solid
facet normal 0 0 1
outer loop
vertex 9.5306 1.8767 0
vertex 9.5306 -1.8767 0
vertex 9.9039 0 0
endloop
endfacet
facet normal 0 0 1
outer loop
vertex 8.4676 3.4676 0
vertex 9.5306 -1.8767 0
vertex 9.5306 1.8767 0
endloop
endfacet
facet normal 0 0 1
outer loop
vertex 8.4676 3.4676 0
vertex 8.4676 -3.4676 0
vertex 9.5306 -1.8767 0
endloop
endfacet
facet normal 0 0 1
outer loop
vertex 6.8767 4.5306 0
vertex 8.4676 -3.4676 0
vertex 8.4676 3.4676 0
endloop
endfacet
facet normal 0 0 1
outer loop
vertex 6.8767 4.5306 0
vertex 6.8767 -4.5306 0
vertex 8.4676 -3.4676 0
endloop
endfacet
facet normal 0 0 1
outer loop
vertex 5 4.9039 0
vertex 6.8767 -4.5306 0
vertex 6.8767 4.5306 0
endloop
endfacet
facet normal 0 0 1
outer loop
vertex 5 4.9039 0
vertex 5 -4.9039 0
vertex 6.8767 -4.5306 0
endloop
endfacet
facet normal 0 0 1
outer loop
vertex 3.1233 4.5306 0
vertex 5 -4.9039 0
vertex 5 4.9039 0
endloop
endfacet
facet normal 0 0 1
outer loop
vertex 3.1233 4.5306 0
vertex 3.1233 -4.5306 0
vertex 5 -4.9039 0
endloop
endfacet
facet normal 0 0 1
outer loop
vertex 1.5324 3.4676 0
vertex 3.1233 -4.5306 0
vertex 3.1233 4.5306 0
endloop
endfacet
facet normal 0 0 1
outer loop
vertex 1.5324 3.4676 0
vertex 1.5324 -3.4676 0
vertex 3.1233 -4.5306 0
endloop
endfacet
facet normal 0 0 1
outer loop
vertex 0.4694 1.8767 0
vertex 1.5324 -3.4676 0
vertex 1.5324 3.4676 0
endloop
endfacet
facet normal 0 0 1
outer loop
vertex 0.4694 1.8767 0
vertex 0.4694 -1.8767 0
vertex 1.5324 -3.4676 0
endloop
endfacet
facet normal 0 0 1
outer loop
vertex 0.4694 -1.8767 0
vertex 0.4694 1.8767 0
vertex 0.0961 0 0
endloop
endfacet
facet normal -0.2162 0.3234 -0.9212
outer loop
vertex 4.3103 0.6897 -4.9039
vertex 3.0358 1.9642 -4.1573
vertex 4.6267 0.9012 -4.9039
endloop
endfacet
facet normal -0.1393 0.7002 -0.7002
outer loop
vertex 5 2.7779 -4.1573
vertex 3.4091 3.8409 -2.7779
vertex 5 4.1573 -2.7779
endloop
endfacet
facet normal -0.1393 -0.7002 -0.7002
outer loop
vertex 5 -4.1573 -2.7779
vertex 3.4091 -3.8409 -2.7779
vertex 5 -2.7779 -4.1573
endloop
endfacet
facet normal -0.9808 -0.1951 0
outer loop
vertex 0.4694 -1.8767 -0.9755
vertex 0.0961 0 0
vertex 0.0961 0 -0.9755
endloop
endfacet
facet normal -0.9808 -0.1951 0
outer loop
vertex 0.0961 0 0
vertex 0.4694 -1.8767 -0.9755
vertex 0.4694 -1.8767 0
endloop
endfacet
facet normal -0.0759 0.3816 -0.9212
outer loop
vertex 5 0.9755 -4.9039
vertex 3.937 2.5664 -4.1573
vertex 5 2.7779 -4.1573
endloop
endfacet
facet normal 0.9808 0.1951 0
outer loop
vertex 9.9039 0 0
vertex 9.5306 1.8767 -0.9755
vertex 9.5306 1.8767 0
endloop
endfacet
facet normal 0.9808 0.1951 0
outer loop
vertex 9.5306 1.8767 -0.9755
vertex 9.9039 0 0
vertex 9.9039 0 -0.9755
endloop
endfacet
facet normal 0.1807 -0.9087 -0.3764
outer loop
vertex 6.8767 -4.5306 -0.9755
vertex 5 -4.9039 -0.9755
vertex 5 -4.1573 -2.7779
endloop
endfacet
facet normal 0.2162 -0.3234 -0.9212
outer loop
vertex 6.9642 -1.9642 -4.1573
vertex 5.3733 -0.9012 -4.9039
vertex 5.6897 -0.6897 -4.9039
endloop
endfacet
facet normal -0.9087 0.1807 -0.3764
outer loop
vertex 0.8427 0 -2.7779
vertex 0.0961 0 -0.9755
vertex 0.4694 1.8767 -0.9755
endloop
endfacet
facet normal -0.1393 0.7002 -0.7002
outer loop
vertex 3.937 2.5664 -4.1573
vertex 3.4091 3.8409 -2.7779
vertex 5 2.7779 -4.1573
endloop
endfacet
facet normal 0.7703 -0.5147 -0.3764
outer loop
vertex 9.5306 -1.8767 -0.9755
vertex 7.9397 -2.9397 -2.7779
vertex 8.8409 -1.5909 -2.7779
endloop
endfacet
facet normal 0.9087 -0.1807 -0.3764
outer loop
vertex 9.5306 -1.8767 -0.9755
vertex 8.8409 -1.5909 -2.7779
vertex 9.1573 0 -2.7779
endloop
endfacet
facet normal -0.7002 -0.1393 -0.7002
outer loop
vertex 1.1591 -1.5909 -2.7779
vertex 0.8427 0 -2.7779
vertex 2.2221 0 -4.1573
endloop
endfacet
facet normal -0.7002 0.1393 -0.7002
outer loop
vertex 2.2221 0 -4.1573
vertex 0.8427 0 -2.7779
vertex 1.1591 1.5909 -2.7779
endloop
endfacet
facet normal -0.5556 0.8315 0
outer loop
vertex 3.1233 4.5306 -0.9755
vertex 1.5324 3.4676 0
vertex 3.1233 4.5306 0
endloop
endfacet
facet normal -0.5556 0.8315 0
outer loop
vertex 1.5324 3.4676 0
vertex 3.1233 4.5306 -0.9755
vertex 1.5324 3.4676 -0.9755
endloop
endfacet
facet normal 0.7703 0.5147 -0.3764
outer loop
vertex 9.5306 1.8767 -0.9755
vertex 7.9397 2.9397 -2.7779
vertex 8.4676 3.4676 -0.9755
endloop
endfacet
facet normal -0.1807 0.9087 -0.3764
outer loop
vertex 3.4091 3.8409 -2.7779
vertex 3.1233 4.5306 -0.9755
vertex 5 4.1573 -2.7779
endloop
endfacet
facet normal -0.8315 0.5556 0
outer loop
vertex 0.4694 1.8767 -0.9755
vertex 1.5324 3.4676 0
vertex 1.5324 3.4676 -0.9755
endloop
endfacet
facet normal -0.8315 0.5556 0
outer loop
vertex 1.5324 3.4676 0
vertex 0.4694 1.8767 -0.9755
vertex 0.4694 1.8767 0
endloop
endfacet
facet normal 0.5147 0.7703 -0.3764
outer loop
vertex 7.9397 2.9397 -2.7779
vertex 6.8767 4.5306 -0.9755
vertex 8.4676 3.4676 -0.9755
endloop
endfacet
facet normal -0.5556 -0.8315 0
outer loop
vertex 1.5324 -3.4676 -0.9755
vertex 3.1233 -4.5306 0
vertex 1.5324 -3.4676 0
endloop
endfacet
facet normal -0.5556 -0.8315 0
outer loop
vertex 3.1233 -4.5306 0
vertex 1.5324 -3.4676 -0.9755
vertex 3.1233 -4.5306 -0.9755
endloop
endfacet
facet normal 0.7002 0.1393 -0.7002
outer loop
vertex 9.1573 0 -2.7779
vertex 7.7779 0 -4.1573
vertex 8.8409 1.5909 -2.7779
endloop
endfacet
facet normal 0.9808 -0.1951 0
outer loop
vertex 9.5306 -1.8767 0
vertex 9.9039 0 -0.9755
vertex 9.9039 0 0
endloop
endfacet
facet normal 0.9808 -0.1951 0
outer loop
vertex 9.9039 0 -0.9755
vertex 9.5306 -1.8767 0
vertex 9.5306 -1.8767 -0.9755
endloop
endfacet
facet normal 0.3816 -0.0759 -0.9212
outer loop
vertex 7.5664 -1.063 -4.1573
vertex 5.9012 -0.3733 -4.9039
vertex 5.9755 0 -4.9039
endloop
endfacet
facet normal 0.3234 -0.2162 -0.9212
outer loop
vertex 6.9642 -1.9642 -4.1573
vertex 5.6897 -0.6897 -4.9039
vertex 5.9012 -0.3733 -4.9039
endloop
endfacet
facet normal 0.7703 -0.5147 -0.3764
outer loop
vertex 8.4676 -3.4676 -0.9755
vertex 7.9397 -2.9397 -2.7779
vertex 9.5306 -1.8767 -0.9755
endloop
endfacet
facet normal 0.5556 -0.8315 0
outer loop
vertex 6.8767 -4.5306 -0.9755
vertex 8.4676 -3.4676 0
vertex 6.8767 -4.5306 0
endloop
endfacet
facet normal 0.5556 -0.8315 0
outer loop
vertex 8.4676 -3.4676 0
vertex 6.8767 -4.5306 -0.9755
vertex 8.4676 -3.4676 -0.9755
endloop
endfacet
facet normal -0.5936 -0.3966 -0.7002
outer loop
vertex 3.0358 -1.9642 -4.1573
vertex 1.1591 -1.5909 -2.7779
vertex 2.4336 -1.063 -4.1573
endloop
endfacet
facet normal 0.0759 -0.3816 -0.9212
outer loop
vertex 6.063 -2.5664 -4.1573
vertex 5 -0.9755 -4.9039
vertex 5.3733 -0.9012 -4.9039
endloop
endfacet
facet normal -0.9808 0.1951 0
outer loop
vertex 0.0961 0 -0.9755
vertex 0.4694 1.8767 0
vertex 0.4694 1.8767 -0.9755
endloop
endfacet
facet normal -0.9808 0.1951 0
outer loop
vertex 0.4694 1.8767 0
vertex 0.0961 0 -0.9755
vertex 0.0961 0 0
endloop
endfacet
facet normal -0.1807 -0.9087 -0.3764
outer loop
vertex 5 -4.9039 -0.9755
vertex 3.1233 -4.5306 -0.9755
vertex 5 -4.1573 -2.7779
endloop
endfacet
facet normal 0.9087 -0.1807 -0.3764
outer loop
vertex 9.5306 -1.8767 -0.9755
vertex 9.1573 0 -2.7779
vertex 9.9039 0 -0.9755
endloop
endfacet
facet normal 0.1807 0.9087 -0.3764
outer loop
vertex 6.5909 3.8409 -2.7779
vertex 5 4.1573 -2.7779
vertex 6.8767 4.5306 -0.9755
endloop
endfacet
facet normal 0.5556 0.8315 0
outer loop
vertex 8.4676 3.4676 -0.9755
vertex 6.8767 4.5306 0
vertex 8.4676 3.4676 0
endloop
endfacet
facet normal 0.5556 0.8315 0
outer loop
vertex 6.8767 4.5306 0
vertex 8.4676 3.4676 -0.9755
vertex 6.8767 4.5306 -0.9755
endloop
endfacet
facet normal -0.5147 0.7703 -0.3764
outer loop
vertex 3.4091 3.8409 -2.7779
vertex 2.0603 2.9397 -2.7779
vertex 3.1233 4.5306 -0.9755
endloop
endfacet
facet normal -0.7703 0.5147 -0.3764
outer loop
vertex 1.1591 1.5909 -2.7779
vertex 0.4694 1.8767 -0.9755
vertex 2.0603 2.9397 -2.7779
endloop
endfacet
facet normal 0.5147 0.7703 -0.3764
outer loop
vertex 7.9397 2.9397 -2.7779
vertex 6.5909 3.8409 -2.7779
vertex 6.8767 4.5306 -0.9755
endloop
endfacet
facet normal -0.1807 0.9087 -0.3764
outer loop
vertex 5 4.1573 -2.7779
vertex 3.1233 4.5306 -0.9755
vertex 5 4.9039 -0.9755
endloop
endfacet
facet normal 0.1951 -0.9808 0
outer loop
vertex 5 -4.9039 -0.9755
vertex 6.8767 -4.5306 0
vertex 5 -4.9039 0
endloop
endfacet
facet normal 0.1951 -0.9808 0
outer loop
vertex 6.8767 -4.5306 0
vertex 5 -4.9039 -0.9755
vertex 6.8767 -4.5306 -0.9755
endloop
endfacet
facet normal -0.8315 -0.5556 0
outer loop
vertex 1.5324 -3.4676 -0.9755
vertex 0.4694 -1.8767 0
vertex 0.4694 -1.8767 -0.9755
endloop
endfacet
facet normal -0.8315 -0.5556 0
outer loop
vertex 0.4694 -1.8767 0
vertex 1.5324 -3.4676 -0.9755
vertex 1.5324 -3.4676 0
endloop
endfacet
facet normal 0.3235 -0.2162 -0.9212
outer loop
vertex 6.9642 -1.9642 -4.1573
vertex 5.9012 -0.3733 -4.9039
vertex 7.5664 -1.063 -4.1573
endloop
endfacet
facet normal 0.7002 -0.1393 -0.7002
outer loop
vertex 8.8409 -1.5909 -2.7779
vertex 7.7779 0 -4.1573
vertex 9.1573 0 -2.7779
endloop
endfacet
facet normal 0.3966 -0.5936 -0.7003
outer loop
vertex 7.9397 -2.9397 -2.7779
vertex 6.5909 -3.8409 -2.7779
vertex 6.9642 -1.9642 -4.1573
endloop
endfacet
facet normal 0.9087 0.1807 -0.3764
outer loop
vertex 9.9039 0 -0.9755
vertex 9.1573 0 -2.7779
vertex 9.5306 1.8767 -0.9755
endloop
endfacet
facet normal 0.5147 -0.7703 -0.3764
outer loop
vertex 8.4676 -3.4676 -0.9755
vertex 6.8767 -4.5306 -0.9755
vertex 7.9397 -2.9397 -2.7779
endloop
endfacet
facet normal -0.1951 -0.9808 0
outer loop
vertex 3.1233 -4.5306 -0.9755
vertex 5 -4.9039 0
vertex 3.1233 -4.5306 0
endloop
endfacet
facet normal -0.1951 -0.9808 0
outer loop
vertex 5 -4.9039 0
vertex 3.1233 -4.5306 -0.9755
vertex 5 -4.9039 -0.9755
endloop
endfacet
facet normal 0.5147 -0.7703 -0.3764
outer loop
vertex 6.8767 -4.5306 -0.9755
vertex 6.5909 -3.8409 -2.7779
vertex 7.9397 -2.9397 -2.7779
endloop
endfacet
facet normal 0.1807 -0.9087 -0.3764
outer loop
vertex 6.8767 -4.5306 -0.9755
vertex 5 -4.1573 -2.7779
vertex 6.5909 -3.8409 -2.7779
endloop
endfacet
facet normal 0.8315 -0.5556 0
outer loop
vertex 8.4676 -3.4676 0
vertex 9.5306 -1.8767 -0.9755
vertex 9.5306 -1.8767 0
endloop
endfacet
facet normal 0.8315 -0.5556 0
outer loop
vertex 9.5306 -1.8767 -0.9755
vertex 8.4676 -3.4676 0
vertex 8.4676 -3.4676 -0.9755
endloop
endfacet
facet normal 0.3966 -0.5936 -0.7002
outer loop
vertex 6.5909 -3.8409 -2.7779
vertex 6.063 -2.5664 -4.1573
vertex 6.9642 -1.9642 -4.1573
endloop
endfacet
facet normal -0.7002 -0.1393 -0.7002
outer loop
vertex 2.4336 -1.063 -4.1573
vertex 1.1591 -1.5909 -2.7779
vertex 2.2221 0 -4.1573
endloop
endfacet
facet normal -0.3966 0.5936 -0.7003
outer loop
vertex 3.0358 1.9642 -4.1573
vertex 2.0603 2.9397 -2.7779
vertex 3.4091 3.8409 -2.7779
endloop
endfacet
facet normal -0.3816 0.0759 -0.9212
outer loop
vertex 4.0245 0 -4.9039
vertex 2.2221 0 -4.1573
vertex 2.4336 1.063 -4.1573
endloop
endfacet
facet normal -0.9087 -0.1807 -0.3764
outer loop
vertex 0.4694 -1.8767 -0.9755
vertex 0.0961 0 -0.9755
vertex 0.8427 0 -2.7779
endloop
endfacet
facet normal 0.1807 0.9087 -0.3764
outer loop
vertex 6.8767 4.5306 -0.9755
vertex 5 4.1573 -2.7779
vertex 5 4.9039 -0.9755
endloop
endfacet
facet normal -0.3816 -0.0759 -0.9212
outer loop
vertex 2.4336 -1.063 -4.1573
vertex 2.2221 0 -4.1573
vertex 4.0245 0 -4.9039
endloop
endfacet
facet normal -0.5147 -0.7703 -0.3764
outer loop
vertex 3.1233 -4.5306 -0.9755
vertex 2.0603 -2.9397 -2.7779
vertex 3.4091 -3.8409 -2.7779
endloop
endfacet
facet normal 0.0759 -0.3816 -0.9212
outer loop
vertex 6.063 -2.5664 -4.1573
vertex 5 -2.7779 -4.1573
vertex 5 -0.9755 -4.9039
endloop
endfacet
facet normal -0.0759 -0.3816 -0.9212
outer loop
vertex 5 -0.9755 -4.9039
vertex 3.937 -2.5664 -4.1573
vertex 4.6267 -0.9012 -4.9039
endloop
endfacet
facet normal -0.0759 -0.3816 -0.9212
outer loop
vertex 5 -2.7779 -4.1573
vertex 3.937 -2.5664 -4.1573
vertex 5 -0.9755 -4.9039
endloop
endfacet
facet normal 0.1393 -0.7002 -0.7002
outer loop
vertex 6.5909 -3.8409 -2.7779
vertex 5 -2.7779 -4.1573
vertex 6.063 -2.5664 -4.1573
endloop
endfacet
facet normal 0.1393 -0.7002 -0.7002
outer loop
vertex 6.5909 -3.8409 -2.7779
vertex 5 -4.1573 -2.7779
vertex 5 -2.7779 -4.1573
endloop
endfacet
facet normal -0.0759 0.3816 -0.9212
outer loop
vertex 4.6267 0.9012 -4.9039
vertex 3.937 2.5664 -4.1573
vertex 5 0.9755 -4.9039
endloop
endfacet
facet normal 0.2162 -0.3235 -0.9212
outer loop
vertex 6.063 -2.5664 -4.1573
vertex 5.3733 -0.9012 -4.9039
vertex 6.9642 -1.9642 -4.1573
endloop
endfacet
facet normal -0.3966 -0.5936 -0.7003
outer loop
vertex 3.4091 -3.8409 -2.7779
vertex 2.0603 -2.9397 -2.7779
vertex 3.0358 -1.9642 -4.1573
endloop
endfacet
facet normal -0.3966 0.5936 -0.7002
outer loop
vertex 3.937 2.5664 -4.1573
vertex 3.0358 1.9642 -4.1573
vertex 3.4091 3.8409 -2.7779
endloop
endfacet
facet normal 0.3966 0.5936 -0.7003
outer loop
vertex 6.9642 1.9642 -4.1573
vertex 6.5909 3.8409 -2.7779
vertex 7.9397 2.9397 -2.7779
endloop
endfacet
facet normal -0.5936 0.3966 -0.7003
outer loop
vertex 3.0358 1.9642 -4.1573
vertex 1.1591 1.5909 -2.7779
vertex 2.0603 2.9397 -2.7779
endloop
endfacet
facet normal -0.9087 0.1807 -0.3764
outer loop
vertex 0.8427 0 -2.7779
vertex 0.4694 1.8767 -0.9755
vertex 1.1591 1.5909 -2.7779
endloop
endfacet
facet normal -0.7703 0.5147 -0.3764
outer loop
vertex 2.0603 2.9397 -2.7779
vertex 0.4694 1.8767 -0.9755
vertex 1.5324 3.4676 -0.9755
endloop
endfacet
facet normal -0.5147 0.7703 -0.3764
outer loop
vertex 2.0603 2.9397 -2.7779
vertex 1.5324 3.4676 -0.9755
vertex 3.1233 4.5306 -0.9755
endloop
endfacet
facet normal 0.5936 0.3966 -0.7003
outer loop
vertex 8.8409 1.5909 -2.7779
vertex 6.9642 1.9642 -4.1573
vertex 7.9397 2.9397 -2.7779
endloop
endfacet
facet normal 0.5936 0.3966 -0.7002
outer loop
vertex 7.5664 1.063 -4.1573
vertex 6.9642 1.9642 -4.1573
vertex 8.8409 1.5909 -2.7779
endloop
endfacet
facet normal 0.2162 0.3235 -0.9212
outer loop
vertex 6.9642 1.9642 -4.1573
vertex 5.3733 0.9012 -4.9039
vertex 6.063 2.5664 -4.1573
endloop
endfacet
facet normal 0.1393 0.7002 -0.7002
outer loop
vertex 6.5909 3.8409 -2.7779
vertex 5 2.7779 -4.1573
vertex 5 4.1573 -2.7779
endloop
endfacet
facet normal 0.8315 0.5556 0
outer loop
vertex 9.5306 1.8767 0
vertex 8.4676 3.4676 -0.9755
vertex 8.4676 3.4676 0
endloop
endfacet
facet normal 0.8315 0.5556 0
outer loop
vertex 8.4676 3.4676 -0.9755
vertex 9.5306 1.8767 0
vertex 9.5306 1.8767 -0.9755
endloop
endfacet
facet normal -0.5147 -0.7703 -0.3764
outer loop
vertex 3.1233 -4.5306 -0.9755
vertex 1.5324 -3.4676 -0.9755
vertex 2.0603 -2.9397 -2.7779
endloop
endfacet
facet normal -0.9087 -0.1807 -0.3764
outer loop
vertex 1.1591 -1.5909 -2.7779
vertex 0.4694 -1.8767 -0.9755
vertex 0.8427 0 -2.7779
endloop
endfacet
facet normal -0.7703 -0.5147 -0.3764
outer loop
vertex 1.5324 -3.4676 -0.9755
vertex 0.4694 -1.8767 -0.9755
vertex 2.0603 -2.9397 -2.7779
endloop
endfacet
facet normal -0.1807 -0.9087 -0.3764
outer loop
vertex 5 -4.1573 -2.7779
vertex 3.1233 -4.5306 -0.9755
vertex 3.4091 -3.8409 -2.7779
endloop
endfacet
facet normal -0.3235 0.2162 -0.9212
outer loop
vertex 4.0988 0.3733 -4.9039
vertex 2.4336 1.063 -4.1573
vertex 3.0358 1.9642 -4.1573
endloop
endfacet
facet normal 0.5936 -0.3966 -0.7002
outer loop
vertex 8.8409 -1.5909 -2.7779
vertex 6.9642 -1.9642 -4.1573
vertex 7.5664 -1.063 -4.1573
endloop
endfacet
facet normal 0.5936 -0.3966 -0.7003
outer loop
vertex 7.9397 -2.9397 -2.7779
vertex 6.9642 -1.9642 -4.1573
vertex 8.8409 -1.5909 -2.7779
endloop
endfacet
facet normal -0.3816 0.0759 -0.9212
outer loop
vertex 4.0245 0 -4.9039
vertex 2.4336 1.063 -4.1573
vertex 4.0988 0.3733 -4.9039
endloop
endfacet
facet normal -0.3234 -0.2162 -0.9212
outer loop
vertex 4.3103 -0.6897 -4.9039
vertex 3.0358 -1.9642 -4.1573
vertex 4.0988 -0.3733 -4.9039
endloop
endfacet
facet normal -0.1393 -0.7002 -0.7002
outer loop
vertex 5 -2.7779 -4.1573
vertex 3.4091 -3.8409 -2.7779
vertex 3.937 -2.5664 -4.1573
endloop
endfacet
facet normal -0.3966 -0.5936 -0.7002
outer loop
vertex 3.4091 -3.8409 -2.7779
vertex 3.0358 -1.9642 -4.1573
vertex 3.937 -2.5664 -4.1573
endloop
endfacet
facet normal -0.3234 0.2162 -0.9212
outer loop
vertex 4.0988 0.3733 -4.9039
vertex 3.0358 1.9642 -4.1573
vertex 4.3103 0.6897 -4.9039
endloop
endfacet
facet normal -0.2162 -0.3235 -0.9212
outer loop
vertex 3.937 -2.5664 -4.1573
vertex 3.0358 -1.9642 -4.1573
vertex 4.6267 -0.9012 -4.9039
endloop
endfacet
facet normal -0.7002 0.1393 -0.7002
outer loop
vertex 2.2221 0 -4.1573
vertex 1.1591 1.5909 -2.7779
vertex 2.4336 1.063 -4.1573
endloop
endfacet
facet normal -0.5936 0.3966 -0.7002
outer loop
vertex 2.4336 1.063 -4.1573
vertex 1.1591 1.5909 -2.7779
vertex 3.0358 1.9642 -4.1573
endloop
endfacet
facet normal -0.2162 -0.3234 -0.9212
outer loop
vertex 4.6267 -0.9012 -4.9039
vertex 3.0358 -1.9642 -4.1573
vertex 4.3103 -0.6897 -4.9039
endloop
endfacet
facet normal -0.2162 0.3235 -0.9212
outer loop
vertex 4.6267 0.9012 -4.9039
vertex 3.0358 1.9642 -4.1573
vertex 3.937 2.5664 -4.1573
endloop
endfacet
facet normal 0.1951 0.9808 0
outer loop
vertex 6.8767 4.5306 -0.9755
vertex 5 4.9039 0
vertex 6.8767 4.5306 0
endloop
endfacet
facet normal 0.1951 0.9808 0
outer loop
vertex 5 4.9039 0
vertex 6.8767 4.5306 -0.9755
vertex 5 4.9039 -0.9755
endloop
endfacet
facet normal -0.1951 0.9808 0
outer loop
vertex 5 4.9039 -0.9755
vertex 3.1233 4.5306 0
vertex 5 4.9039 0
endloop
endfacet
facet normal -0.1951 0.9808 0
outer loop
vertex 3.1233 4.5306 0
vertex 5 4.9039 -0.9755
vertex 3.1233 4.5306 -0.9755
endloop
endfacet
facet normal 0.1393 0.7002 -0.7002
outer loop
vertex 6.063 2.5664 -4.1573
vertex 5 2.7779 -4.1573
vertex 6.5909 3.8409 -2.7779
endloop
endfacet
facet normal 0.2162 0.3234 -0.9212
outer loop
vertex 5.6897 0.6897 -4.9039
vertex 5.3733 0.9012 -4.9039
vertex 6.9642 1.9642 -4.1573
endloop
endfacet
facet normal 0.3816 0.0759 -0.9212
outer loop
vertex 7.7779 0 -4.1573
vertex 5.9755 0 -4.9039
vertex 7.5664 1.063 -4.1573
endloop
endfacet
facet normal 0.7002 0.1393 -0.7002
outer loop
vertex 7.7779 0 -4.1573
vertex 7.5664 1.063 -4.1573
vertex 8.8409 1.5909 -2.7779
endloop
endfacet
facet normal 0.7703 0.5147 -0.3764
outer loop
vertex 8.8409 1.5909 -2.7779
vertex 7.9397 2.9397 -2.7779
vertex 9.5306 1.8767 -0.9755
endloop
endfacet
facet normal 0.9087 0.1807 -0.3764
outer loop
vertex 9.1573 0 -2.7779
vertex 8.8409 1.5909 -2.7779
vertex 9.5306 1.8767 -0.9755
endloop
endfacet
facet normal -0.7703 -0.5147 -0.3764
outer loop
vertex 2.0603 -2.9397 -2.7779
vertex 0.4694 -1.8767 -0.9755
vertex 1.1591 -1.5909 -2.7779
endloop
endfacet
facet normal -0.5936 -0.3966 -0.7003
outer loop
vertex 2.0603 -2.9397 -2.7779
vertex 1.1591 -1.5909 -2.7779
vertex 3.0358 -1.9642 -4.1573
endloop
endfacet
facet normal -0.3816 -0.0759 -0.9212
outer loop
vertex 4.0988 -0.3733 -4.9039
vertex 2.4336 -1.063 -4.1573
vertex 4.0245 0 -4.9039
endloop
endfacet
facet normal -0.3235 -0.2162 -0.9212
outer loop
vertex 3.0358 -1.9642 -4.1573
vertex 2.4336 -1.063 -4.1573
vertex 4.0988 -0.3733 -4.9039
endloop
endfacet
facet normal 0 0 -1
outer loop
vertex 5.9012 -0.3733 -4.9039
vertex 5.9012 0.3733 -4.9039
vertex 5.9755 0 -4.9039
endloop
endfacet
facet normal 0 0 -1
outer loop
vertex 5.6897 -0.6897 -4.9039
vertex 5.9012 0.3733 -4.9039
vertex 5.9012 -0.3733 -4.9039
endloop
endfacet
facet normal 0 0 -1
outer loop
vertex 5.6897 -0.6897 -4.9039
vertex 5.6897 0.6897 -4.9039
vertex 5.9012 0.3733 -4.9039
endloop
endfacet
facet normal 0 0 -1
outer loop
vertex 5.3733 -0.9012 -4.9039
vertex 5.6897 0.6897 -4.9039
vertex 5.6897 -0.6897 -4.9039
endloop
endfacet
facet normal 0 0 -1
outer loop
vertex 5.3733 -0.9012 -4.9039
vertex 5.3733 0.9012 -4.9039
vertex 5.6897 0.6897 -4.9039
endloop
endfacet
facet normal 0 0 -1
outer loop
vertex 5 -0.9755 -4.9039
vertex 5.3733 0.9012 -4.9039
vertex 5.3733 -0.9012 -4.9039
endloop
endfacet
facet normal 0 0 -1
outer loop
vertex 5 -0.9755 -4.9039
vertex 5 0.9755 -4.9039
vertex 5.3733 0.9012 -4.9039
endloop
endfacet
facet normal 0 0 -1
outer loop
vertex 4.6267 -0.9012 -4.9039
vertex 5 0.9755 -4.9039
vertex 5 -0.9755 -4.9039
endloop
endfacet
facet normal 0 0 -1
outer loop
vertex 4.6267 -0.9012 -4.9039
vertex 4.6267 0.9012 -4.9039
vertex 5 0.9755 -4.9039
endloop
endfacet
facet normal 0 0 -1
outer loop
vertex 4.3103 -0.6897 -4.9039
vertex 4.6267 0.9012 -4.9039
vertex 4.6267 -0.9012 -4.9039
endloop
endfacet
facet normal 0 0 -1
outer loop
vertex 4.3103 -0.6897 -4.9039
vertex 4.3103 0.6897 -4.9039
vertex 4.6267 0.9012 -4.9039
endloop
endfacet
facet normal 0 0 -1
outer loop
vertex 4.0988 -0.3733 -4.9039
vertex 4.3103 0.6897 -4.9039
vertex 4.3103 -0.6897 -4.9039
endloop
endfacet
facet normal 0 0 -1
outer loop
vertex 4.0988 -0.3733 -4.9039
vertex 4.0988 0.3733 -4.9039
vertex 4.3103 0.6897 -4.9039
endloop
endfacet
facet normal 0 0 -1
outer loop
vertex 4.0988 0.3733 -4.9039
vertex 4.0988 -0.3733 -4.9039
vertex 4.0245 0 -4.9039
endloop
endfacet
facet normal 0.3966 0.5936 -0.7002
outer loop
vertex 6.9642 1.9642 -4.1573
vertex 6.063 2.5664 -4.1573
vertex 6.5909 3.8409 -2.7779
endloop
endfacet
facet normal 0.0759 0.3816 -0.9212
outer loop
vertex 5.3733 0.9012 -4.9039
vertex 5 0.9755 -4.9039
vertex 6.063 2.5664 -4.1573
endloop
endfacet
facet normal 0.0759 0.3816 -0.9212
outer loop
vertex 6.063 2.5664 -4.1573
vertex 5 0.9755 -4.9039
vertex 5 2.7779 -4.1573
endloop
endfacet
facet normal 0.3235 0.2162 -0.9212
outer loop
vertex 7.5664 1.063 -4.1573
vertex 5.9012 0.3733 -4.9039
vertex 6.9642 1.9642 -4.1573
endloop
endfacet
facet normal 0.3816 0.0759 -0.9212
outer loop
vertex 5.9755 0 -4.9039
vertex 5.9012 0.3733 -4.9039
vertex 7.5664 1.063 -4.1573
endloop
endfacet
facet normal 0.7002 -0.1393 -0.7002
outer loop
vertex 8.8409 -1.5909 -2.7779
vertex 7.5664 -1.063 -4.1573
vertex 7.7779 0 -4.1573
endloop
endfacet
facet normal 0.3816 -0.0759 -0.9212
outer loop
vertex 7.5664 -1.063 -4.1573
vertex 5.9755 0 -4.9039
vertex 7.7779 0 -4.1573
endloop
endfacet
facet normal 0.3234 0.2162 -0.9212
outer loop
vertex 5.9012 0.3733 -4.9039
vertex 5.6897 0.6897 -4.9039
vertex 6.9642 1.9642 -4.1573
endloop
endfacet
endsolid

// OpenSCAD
// Generated by SolidPython 1.0.5 on 2021-02-20 09:51:21


difference() {
	union() {
		cube(size = 5);
		translate(v = [5, 0, 0]) {
			sphere(r = 5);
		}
	}
	cylinder(h = 6, r = 10);
}
/***********************************************
*********      SolidPython code:      **********
************************************************
 
import os
from solid import *
from solid.utils import *
d = cube(5) + right(5)(sphere(5)) - cylinder(r=10, h=6)

scad_render_to_file(d, os.path.join(os.path.dirname(__file__), "result.scad"))
 
 
************************************************/
